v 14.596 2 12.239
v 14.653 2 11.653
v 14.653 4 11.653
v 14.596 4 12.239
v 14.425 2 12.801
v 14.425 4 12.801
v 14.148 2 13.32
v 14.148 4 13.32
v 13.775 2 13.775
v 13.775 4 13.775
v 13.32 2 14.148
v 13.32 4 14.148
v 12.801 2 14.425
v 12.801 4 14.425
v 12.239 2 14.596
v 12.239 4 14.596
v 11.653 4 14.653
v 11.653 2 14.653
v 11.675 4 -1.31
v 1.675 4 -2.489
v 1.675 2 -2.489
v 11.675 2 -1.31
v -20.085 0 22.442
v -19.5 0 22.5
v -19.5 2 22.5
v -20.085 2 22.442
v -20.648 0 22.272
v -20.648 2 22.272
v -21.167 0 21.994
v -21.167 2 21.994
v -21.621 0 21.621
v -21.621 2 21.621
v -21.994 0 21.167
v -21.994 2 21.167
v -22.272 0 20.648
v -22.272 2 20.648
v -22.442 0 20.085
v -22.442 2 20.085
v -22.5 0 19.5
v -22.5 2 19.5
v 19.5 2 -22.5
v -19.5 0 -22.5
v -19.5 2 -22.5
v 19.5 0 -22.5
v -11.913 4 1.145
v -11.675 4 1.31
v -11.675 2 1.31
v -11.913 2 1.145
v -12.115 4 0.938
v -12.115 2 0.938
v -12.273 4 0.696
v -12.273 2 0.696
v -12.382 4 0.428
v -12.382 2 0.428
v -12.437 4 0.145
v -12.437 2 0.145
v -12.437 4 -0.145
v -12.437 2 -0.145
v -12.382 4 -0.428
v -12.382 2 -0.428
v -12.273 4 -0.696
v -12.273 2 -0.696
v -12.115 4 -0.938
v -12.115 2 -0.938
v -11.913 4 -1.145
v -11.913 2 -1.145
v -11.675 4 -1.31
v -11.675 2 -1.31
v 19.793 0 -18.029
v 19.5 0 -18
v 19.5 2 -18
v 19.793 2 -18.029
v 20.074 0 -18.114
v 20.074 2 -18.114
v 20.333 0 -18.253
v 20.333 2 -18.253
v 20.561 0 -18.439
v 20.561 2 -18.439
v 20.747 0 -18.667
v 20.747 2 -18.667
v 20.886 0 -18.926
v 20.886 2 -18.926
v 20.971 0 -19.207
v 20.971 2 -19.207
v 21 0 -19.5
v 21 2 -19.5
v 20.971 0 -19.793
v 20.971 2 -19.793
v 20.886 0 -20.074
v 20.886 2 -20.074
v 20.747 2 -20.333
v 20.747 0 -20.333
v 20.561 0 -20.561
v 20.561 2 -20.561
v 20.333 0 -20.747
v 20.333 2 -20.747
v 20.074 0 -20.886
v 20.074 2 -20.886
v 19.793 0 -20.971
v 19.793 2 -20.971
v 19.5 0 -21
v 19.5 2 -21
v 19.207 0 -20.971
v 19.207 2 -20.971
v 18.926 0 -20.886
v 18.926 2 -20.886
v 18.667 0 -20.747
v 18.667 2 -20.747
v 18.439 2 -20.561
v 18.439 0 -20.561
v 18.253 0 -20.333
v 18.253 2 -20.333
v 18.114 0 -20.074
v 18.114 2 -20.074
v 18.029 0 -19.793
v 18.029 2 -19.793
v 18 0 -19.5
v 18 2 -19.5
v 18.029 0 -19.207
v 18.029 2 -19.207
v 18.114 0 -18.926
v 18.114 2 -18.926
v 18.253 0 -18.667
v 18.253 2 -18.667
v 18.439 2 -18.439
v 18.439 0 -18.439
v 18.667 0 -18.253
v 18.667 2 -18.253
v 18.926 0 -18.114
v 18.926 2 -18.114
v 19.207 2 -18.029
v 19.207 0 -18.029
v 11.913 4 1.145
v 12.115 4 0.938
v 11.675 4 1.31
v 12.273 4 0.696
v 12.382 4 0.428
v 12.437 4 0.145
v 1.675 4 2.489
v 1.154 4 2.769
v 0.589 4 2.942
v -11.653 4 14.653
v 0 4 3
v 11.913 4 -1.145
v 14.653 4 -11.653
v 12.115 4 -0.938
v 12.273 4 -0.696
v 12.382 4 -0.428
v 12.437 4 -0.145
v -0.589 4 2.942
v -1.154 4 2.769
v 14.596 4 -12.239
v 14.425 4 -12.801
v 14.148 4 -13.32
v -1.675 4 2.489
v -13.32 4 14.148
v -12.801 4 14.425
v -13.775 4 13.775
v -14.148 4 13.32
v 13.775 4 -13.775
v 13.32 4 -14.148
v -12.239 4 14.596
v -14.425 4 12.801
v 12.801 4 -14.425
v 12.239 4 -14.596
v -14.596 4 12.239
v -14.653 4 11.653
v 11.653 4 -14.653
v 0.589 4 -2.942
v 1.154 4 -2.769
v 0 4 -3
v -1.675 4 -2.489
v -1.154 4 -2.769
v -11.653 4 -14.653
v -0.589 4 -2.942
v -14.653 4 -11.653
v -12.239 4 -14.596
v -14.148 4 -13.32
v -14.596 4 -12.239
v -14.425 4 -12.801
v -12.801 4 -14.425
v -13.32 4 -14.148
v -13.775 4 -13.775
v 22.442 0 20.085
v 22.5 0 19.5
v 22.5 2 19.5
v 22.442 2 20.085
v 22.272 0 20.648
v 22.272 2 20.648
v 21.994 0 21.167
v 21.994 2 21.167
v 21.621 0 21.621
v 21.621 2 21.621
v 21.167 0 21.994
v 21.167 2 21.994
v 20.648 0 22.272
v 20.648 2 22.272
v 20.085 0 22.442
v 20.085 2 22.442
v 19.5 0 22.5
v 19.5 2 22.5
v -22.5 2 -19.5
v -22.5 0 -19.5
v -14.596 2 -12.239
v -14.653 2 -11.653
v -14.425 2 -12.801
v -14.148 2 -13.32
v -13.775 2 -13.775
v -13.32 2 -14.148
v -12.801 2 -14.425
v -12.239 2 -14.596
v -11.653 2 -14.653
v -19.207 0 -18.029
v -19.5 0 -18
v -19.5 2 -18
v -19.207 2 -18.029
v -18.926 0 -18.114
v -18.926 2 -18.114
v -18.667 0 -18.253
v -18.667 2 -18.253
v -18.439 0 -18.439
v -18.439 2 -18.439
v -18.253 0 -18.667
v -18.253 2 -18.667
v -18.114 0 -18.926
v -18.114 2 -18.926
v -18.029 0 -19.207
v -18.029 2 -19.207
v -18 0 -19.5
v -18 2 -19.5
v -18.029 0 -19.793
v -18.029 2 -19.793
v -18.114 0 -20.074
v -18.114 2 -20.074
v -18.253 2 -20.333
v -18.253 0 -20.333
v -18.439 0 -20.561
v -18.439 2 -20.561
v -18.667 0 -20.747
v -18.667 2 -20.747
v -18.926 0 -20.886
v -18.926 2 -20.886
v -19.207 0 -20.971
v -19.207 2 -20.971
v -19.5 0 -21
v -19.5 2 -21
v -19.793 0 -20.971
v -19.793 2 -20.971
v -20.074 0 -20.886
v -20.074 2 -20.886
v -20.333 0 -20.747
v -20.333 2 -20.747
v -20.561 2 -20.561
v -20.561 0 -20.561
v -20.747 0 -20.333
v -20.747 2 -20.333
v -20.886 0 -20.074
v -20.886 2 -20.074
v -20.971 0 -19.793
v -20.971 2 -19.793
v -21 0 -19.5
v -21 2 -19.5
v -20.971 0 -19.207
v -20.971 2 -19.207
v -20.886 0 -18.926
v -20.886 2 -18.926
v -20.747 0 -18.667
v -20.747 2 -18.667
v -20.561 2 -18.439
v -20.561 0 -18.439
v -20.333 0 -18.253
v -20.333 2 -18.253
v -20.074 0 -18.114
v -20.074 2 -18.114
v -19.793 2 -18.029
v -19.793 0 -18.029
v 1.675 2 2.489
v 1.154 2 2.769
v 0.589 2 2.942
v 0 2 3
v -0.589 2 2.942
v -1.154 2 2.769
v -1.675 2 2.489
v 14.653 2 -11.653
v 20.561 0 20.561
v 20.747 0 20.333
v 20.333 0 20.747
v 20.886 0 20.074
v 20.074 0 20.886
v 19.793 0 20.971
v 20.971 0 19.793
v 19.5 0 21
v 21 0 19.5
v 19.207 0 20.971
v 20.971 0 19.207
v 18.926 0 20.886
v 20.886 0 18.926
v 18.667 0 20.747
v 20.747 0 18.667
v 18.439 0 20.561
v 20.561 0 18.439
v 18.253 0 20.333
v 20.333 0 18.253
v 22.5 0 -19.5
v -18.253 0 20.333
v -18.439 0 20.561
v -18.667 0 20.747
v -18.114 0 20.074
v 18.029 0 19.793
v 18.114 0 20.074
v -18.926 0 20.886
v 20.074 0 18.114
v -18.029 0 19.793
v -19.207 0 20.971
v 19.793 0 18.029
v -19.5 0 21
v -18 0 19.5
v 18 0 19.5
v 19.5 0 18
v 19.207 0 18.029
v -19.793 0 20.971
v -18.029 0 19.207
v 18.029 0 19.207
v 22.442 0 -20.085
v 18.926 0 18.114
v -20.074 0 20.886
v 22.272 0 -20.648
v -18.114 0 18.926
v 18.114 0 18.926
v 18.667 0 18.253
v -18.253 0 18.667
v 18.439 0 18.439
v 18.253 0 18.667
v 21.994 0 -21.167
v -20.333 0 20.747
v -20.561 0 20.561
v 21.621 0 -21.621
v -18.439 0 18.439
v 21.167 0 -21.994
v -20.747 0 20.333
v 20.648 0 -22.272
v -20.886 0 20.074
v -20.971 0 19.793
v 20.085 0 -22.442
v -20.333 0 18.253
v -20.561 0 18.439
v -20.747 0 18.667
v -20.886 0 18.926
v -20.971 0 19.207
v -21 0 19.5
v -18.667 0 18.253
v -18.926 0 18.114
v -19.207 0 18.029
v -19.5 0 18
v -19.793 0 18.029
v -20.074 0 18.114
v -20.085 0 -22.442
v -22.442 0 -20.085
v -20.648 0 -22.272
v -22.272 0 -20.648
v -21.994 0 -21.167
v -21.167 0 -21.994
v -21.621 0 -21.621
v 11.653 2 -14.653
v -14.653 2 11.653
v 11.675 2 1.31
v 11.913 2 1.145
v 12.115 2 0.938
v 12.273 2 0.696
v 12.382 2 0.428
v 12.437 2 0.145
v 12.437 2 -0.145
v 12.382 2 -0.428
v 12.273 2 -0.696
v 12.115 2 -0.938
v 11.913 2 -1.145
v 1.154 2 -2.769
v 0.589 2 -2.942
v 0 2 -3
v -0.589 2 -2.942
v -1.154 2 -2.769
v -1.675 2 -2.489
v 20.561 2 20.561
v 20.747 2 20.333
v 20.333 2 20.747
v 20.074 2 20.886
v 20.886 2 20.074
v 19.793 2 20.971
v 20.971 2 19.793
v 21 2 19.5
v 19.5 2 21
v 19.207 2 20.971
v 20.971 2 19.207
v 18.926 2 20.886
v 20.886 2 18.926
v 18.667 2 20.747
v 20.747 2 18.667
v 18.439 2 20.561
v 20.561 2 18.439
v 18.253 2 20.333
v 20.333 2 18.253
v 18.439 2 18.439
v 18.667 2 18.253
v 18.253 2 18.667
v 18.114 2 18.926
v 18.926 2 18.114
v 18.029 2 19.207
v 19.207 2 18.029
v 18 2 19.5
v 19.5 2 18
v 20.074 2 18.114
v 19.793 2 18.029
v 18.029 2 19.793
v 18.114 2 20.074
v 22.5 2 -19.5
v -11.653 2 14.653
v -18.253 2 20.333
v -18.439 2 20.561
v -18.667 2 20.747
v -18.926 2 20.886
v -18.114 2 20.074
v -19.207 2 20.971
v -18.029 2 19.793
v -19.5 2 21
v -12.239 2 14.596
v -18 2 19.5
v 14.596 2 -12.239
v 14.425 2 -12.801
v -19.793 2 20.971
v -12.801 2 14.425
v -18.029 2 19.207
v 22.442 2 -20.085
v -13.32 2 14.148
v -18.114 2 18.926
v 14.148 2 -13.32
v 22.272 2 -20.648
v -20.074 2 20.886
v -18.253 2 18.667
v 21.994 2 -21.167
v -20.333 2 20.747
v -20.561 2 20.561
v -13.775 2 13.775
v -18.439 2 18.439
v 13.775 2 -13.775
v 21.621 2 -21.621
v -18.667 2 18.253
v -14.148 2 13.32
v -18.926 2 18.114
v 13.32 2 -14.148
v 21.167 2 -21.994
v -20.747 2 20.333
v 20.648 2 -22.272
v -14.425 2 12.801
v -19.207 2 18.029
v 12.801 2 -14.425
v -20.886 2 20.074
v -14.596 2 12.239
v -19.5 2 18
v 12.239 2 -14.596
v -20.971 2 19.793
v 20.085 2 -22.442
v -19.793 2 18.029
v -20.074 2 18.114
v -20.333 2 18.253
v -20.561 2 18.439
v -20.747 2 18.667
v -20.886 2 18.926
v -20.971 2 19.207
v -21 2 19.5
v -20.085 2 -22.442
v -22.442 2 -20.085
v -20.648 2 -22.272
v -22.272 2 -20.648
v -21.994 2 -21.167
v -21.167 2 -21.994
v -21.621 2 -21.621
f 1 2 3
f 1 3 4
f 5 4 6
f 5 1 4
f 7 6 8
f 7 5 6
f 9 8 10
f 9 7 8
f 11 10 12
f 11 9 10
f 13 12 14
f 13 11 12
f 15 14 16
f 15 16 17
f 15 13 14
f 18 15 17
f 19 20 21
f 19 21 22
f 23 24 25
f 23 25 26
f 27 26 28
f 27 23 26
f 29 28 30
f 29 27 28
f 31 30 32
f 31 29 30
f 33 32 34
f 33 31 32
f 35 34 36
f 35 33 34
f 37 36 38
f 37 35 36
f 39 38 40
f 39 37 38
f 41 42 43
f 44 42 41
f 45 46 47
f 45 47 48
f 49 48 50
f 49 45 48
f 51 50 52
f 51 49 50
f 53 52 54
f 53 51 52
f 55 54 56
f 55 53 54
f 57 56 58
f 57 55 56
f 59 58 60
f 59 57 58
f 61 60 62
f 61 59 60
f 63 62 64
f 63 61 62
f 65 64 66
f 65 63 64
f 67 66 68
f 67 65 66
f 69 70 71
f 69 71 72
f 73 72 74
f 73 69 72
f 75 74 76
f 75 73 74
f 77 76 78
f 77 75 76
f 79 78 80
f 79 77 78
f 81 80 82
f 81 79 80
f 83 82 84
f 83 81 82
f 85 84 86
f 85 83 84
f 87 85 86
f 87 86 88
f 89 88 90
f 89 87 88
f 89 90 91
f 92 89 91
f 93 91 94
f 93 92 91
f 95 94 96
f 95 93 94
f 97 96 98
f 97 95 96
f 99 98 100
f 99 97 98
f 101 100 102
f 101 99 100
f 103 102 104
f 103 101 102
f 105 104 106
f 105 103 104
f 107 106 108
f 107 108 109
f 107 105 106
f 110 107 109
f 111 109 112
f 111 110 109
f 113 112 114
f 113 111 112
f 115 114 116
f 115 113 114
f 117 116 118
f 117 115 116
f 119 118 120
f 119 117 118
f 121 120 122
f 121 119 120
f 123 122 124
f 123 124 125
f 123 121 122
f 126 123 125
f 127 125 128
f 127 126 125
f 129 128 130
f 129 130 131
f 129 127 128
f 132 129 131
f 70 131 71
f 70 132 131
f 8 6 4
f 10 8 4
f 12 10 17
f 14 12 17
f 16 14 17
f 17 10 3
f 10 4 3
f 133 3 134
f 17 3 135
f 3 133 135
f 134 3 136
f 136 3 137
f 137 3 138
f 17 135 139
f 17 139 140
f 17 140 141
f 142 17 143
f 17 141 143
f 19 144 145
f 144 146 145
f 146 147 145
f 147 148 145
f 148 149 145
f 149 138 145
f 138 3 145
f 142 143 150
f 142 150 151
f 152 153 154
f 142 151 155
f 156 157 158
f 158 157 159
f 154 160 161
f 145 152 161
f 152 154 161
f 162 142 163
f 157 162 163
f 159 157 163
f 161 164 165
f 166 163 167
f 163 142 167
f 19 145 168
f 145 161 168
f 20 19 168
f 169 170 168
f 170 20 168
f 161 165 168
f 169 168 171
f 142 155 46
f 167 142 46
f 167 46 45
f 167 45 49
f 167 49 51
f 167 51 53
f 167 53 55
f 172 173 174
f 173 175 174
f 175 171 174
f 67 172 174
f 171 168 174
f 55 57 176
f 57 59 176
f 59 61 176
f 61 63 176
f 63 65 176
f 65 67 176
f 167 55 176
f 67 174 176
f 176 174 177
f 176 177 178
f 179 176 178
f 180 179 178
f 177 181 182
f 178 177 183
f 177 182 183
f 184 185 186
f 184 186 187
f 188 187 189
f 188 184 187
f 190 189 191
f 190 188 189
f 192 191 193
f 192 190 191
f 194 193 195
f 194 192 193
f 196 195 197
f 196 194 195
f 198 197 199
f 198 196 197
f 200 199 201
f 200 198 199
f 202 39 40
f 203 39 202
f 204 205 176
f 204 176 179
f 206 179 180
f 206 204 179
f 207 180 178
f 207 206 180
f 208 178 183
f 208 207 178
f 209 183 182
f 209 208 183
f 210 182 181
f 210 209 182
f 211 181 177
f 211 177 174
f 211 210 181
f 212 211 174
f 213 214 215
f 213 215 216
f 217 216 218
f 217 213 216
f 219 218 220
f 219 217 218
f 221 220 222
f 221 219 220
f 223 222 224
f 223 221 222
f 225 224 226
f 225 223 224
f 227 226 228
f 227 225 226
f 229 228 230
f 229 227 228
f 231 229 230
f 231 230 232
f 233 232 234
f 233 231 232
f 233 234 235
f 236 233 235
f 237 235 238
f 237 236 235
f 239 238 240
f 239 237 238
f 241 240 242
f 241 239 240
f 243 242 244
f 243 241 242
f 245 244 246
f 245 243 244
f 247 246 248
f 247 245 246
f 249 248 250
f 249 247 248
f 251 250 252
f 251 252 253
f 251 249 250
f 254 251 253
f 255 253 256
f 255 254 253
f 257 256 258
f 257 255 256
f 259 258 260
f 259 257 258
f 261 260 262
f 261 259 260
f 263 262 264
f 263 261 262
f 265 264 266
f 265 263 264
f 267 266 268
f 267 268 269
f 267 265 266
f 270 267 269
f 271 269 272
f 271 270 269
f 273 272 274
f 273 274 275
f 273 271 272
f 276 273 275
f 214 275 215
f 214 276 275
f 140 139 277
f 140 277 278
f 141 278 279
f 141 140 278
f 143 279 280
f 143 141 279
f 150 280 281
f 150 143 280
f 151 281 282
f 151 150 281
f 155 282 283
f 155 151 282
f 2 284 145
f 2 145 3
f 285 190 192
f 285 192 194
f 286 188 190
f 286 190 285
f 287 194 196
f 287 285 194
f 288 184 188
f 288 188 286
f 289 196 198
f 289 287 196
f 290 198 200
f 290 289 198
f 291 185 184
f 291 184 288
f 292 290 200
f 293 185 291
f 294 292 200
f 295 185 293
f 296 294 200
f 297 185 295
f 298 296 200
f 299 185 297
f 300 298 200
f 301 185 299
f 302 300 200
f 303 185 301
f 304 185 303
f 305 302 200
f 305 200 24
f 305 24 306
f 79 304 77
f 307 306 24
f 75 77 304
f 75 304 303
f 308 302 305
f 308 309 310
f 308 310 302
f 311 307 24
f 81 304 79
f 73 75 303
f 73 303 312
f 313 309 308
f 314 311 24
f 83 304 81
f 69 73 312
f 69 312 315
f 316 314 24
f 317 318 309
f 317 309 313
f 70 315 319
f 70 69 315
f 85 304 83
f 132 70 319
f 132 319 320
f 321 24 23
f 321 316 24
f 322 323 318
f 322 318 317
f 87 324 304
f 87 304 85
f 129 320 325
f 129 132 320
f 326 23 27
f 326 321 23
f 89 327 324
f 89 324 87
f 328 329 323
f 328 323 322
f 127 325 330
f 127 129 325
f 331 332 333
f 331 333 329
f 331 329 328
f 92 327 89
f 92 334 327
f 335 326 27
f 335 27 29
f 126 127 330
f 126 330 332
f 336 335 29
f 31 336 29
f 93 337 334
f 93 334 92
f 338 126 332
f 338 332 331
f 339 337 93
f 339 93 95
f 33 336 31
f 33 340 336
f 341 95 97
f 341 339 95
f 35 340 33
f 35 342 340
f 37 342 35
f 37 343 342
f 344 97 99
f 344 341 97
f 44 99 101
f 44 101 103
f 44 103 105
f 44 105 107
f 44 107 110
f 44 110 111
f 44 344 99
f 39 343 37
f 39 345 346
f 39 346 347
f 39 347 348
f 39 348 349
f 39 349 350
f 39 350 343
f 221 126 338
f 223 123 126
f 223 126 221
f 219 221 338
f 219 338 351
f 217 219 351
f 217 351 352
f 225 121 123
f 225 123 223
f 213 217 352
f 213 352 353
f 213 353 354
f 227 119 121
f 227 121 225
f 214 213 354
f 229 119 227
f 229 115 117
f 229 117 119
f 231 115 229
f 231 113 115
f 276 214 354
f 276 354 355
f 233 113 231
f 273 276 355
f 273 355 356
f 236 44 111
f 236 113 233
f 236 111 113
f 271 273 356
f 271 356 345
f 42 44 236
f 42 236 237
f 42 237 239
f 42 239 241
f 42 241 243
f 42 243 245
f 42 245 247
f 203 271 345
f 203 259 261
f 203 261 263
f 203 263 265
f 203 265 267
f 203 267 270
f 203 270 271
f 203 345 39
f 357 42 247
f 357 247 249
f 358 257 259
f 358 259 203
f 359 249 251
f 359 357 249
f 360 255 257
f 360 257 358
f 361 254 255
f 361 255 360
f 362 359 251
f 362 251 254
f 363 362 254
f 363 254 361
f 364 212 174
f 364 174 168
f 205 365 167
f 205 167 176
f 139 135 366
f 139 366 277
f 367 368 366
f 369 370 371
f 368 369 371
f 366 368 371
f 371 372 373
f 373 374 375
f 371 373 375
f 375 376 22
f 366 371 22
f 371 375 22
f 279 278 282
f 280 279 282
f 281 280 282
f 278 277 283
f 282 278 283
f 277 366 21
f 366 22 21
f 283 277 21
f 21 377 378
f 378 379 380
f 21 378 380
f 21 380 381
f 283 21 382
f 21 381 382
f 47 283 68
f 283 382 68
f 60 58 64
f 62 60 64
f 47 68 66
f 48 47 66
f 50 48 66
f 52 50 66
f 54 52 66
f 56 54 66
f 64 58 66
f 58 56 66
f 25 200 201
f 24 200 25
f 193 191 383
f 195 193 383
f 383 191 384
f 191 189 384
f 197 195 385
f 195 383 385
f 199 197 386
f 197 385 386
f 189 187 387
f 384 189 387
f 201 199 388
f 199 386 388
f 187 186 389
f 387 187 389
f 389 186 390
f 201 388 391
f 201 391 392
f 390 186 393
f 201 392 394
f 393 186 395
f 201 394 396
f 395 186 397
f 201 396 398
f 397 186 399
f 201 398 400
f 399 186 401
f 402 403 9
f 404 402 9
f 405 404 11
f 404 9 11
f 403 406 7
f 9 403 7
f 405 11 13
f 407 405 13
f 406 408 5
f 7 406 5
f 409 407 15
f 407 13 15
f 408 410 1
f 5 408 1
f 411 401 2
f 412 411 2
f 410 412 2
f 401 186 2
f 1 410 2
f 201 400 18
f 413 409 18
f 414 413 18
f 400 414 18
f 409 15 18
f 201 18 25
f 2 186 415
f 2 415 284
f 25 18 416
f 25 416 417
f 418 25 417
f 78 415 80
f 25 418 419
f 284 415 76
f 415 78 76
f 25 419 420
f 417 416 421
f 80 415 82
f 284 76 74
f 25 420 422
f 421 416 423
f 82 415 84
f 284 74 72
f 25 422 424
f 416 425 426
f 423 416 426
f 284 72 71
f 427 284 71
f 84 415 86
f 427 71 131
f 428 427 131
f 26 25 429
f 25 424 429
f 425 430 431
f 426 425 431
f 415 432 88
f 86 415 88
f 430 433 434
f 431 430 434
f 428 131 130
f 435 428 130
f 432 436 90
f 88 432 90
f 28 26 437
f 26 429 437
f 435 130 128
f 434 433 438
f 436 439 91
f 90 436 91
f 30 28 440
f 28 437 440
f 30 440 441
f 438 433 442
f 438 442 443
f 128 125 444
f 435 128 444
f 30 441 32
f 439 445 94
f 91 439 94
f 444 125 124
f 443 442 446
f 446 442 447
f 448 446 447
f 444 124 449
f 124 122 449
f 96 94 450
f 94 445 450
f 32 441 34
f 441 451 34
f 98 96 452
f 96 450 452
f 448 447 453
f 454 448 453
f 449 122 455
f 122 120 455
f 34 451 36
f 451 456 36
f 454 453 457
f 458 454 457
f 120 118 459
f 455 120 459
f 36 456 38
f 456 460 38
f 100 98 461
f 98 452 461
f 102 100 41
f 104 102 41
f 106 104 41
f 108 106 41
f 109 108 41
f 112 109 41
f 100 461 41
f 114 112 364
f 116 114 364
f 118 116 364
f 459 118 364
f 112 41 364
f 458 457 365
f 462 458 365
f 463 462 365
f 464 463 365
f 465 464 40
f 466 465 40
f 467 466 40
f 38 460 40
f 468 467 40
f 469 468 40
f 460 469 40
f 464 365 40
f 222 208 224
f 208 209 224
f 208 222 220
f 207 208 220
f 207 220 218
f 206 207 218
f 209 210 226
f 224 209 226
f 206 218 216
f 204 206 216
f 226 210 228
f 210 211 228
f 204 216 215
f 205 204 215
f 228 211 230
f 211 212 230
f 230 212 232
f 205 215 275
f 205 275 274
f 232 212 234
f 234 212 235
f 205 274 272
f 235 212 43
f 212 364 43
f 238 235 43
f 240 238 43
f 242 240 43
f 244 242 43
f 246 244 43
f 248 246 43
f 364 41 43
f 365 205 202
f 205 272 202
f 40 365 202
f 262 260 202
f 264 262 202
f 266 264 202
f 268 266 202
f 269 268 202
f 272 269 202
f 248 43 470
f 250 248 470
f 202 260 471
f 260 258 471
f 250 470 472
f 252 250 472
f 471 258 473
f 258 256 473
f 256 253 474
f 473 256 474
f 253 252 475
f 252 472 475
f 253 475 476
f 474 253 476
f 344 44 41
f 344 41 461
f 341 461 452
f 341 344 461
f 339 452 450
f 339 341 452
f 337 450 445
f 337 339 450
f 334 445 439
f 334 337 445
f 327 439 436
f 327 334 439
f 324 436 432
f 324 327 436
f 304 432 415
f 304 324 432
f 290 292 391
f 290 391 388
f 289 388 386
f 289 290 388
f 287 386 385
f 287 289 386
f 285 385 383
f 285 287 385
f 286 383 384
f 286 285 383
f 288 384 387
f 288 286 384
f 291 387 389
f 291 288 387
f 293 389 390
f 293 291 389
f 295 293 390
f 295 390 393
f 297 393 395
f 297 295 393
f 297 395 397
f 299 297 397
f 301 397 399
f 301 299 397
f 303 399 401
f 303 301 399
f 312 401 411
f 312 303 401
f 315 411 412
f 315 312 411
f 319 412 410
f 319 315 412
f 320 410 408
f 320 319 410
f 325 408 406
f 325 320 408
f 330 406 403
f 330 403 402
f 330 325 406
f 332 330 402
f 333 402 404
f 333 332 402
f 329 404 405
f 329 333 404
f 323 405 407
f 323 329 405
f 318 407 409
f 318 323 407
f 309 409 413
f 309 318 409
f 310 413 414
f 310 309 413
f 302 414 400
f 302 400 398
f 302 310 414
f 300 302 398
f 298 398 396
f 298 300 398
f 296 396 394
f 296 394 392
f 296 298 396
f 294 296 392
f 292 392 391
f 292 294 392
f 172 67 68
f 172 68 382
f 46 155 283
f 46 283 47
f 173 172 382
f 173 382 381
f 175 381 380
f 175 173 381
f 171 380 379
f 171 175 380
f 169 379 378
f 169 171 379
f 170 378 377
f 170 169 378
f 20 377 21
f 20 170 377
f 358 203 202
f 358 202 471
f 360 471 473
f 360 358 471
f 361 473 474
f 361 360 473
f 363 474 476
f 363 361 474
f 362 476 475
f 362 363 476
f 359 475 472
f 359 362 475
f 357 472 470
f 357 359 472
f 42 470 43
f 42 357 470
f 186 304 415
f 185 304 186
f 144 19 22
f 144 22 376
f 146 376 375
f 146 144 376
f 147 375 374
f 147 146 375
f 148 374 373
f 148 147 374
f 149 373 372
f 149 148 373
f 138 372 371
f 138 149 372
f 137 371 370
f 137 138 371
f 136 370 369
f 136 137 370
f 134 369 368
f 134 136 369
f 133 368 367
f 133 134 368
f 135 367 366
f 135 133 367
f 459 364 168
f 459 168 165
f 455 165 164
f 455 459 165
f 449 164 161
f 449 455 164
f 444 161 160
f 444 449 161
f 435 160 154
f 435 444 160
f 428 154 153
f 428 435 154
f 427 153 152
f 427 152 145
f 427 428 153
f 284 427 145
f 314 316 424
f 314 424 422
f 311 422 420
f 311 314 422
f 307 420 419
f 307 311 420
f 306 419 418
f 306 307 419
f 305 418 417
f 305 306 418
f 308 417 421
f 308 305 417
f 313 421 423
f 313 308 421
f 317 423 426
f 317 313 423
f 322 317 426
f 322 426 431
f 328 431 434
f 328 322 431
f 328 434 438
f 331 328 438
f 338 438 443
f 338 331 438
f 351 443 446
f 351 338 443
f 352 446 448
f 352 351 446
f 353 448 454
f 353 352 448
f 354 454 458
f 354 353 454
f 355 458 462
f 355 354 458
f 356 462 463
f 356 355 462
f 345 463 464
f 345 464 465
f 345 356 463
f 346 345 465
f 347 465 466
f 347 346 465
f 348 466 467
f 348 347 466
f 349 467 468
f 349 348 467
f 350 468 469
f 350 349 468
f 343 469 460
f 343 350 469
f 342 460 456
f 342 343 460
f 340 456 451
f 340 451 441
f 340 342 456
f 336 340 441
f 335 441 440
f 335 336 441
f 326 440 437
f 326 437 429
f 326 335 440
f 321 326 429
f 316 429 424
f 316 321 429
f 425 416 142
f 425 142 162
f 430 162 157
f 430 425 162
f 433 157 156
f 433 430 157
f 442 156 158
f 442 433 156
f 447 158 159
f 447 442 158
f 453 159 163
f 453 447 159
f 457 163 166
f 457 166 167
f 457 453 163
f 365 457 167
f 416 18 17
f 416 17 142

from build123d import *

# Parameters (mm, degrees)
SKETCH2_R           = 1.5
BOSS_EXTRUDE1_DEPTH = 2
BOSS_EXTRUDE2_DEPTH = 2
CUT_EXTRUDE1_DEPTH  = 2


with BuildPart() as part:
    # Sketch2 → Boss-Extrude1 (new body)
    with BuildSketch(Plane(origin=(0, 0, 0), x_dir=(1, 0, 0), z_dir=(0, 1, 0))):
        with BuildLine():
            Line((-19.5, 22.5), (19.5, 22.5))
            ThreePointArc((19.5, 22.5), (21.621320344, 21.621320344), (22.5, 19.5))
            Line((22.5, 19.5), (22.5, -19.5))
            ThreePointArc((22.5, -19.5), (21.621320344, -21.621320344), (19.5, -22.5))
            Line((19.5, -22.5), (-19.5, -22.5))
            ThreePointArc((-19.5, -22.5), (-21.621320344, -21.621320344), (-22.5, -19.5))
            Line((-22.5, -19.5), (-22.5, 19.5))
            ThreePointArc((-22.5, 19.5), (-21.621320344, 21.621320344), (-19.5, 22.5))
        make_face()
        with Locations(Location((19.5, -19.5, 0), (0, 0, 270))):
            Circle(SKETCH2_R, mode=Mode.SUBTRACT)
        with Locations(Location((19.5, 19.5, 0), (0, 0, 270))):
            Circle(SKETCH2_R, mode=Mode.SUBTRACT)
        with Locations(Location((-19.5, 19.5, 0), (0, 0, 270))):
            Circle(SKETCH2_R, mode=Mode.SUBTRACT)
        with Locations(Location((-19.5, -19.5, 0), (0, 0, 270))):
            Circle(SKETCH2_R, mode=Mode.SUBTRACT)
    extrude(amount=BOSS_EXTRUDE1_DEPTH)

    # Sketch3 → Boss-Extrude2 (add)
    with BuildSketch(Plane(origin=(0, 2, 0), x_dir=(1, 0, 0), z_dir=(0, 1, 0))):
        with BuildLine():
            Line((-11.653247837, 14.653247837), (11.653247837, 14.653247837))
            ThreePointArc((11.653247837, 14.653247837), (13.774568181, 13.774568181), (14.653247837, 11.653247837))
            Line((14.653247837, 11.653247837), (14.653247837, -11.653247837))
            ThreePointArc((14.653247837, -11.653247837), (13.774568181, -13.774568181), (11.653247837, -14.653247837))
            Line((11.653247837, -14.653247837), (-11.653247837, -14.653247837))
            ThreePointArc((-11.653247837, -14.653247837), (-13.774568181, -13.774568181), (-14.653247837, -11.653247837))
            Line((-14.653247837, -11.653247837), (-14.653247837, 11.653247837))
            ThreePointArc((-14.653247837, 11.653247837), (-13.774568181, 13.774568181), (-11.653247837, 14.653247837))
        make_face()
    extrude(amount=BOSS_EXTRUDE2_DEPTH)

    # Sketch4 → Cut-Extrude1 (cut)
    with BuildSketch(Plane(origin=(0, 4, 0), x_dir=(1, 0, 0), z_dir=(0, 1, 0))):
        with BuildLine():
            Line((11.675246151, -1.309846963), (1.675246151, -2.488684458))
            ThreePointArc((1.675246151, -2.488684458), (0, -3), (-1.675246151, -2.488684458))
            Line((-1.675246151, -2.488684458), (-11.675246151, -1.309846963))
            ThreePointArc((-11.675246151, -1.309846963), (-12.444287238, 0), (-11.675246151, 1.309846963))
            Line((-11.675246151, 1.309846963), (-1.675246151, 2.488684458))
            ThreePointArc((-1.675246151, 2.488684458), (0, 3), (1.675246151, 2.488684458))
            Line((1.675246151, 2.488684458), (11.675246151, 1.309846963))
            ThreePointArc((11.675246151, 1.309846963), (12.444287238, 0), (11.675246151, -1.309846963))
        make_face()
    extrude(amount=-CUT_EXTRUDE1_DEPTH, mode=Mode.SUBTRACT)


solid = part.part
